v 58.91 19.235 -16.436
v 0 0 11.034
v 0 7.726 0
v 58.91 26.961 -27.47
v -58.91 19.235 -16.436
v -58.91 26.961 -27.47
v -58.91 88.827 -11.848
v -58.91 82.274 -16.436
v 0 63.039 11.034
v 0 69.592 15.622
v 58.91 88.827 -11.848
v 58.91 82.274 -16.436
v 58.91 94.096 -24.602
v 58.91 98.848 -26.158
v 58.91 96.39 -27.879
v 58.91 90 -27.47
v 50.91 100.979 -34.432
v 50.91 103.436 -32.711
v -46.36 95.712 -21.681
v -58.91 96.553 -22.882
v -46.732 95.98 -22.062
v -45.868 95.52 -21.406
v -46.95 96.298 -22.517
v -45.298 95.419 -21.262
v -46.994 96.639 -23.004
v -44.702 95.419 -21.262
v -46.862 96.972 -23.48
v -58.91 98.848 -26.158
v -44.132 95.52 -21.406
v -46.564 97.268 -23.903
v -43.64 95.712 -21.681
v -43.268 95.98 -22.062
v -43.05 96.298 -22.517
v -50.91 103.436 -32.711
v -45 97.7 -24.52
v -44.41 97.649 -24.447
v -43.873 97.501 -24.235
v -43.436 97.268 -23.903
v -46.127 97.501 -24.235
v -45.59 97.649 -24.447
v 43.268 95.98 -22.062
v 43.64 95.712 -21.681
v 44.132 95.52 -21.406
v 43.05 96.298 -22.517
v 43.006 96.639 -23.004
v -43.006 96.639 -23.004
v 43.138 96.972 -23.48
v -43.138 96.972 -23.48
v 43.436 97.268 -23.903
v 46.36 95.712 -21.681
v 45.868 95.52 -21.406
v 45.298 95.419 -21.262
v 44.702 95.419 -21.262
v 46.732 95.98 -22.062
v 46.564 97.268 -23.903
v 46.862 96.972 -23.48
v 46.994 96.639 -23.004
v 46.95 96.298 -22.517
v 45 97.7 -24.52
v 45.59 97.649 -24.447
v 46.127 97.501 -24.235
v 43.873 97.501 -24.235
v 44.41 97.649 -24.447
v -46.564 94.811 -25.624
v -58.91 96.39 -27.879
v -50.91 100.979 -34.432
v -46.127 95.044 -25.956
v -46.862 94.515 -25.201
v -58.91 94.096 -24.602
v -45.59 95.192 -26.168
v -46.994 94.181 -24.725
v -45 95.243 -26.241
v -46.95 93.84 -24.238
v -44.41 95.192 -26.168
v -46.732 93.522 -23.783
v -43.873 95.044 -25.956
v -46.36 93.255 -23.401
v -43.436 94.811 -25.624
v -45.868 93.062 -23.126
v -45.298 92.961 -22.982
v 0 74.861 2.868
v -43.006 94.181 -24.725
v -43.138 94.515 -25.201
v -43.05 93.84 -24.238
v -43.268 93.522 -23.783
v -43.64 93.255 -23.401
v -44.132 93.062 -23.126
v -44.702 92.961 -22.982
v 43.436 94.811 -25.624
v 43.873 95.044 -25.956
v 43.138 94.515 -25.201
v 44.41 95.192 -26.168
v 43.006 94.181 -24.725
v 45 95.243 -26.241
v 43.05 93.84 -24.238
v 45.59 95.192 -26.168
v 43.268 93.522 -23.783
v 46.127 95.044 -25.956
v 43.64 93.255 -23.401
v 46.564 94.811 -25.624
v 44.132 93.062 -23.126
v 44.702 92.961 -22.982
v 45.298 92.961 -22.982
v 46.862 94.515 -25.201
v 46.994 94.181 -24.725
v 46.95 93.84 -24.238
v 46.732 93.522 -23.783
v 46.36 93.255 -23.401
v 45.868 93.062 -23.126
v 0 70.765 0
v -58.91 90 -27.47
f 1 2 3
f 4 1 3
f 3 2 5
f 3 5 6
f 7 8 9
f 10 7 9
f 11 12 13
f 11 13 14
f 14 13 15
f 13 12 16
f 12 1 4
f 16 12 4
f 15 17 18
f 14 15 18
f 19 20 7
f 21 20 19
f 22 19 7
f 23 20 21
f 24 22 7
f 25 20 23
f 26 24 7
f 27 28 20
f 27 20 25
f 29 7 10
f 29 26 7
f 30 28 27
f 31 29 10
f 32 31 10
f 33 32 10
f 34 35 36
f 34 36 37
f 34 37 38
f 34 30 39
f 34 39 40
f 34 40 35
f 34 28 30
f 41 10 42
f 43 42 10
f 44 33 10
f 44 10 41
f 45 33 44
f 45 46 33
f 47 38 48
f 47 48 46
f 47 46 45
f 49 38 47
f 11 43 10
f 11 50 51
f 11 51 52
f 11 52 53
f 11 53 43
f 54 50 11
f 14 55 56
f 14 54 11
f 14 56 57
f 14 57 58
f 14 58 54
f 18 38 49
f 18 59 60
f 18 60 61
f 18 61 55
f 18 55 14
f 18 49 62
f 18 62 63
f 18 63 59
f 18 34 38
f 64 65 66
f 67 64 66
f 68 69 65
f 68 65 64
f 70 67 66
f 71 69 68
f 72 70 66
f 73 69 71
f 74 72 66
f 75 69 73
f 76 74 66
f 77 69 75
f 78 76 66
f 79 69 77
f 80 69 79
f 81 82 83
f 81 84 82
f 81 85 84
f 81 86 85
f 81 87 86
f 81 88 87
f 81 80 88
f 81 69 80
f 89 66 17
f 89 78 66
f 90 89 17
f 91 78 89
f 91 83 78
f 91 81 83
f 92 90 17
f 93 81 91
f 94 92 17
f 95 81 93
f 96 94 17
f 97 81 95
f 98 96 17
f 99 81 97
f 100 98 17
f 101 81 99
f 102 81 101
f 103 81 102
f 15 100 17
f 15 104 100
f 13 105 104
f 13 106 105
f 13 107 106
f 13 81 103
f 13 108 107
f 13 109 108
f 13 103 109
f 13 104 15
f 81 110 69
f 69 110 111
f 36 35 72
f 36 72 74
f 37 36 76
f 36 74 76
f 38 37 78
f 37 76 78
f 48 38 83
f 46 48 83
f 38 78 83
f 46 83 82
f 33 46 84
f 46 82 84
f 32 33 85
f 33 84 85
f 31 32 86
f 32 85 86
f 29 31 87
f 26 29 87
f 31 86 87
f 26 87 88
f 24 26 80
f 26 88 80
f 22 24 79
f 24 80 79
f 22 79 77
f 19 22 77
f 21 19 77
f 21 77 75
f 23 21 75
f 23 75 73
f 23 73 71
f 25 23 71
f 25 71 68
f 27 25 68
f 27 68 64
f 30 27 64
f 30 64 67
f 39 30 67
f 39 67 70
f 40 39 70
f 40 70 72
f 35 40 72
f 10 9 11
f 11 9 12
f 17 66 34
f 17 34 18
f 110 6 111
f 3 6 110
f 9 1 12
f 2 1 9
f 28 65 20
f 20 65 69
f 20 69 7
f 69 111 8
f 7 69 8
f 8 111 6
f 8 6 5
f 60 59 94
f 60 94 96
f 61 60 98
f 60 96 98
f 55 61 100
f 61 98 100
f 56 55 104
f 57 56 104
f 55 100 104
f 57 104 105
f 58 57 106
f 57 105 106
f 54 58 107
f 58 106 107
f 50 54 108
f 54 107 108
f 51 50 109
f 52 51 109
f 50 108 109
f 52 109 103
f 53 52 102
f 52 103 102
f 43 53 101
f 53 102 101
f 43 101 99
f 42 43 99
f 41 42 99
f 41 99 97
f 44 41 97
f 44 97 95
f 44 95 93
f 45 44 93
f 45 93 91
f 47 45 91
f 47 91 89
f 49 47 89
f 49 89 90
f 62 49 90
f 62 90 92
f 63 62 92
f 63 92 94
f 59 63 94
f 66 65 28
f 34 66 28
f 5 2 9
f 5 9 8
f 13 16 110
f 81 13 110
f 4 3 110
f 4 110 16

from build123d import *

# Parameters (mm, degrees)
EXTRUDE_2_DEPTH          = 90
CUT_EXTRUDE_1_DEPTH      = 114.317207464
CUT_EXTRUDE_1_DEPTH_BACK = 114.317207464
EXTRUDE_3_DEPTH          = 8
SKETCH_8_OUTSIDE_W       = 163.572
SKETCH_8_OUTSIDE_H       = 147.98
SKETCH_8_OUTSIDE_W_2     = 117.820012314
SKETCH_8_OUTSIDE_H_2     = 106.962978805
CUT_EXTRUDE_2_DEPTH      = 117.531399887
SKETCH_9_R               = 2
CUT_EXTRUDE_3_DEPTH      = 115.369004136
SKETCH_10_W              = 117.820012314
SKETCH_10_H              = 8
CUT_EXTRUDE_4_DEPTH      = 20
CUT_EXTRUDE_6_DEPTH      = 5
CHAMFER_1_SIZE           = 8


with BuildPart() as part:
    # 草图5 → 拉伸-薄壁2 (new body)
    with BuildSketch(Plane(origin=(0, 0, 0), x_dir=(1, 0, 0), z_dir=(0, 1, 0))):
        Polygon((-58.910006157, 27.470187013), (0, 0), (58.910006157, 27.470187013), (63.136188775, 18.407109143), (0, -11.03377919), (-63.136188775, 18.407109143), align=None)
    extrude(amount=EXTRUDE_2_DEPTH)

    # 草图6 → 切除-拉伸1 (cut, two sides: drawn at the far end of the back side and taken through both)
    with BuildSketch(Plane(origin=(0, 0, 0), x_dir=(0, 0, -1), z_dir=(1, 0, 0)).offset(-CUT_EXTRUDE_1_DEPTH_BACK)):
        Polygon((-11.03377919, 0), (27.470187013, 26.960767386), (27.470187013, 0), align=None)
        Polygon((27.470187013, 90), (-11.03377919, 63.039232614), (-11.03377919, 90), align=None)
    extrude(amount=CUT_EXTRUDE_1_DEPTH + CUT_EXTRUDE_1_DEPTH_BACK, mode=Mode.SUBTRACT)

    # 草图7 → 凸台-拉伸3 (add)
    with BuildSketch(Plane(origin=(0, 47.484140436, 33.248753079), x_dir=(1, 0, 0), z_dir=(0, 0.8191520442889949, 0.5735764363510419))):
        Polygon((63.136188775, 63.06016396), (58.910006157, 74.12413912), (58.910006157, 94.12413912), (-58.910006157, 94.12413912), (-58.910006157, 74.12413912), (-63.136188775, 63.06016396), (0, 27.119475614), align=None)
    extrude(amount=EXTRUDE_3_DEPTH)

    # 草图8 outside → 切除-拉伸2 (cut, through all)
    with BuildSketch(Plane(origin=(0, 54.03735679, 37.837364569), x_dir=(1, 0, 0), z_dir=(0, 0.8191520442889948, 0.5735764363510418))):
        with Locations((0, 42.543)):
            Rectangle(SKETCH_8_OUTSIDE_W, SKETCH_8_OUTSIDE_H)
        with Locations((0, 40.642649718)):
            Rectangle(SKETCH_8_OUTSIDE_W_2, SKETCH_8_OUTSIDE_H_2, mode=Mode.SUBTRACT)
    extrude(amount=-CUT_EXTRUDE_2_DEPTH, mode=Mode.SUBTRACT)

    # 草图9 → 切除-拉伸3 (cut, through all)
    with BuildSketch(Plane(origin=(0, 47.484140436, 33.248753079), x_dir=(1, 0, 0), z_dir=(0, -0.8191520442889949, -0.5735764363510419))):
        with Locations(Location((-45, -74.12413912, 0), (0, 0, 270))):
            Circle(SKETCH_9_R)
        with Locations(Location((45, -74.12413912, 0), (0, 0, 270))):
            Circle(SKETCH_9_R)
    extrude(amount=-CUT_EXTRUDE_3_DEPTH, mode=Mode.SUBTRACT)

    # 草图10 → 切除-拉伸4 (cut)
    with BuildSketch(Plane(origin=(0, 47.484140436, 33.248753079), x_dir=(1, 0, 0), z_dir=(0, -0.8191520442889949, -0.5735764363510419))):
        with Locations((0, -90.12413912)):
            Rectangle(SKETCH_10_W, SKETCH_10_H)
    extrude(amount=-CUT_EXTRUDE_4_DEPTH, mode=Mode.SUBTRACT)

    # 草图11 → 切除-拉伸6 (cut)
    with BuildSketch(Plane(origin=(0, 47.484140436, 33.248753079), x_dir=(1, 0, 0), z_dir=(0, -0.8191520442889949, -0.5735764363510419))):
        Polygon((-58.910006157, -86.12413912), (58.910006157, -86.12413912), (58.910006157, -74.12413912), (0, -40.589232866), (-58.910006157, -74.12413912), align=None)
    extrude(amount=-CUT_EXTRUDE_6_DEPTH, mode=Mode.SUBTRACT)

    # 倒角1
    chamfer_1_edges = [part.edges().sort_by_distance(p)[0] for p in [
        (-58.910006157, 102.207405524, -33.571764708),
        (58.910006157, 102.207405524, -33.571764708),
    ]]
    chamfer(chamfer_1_edges, length=CHAMFER_1_SIZE)


solid = part.part
